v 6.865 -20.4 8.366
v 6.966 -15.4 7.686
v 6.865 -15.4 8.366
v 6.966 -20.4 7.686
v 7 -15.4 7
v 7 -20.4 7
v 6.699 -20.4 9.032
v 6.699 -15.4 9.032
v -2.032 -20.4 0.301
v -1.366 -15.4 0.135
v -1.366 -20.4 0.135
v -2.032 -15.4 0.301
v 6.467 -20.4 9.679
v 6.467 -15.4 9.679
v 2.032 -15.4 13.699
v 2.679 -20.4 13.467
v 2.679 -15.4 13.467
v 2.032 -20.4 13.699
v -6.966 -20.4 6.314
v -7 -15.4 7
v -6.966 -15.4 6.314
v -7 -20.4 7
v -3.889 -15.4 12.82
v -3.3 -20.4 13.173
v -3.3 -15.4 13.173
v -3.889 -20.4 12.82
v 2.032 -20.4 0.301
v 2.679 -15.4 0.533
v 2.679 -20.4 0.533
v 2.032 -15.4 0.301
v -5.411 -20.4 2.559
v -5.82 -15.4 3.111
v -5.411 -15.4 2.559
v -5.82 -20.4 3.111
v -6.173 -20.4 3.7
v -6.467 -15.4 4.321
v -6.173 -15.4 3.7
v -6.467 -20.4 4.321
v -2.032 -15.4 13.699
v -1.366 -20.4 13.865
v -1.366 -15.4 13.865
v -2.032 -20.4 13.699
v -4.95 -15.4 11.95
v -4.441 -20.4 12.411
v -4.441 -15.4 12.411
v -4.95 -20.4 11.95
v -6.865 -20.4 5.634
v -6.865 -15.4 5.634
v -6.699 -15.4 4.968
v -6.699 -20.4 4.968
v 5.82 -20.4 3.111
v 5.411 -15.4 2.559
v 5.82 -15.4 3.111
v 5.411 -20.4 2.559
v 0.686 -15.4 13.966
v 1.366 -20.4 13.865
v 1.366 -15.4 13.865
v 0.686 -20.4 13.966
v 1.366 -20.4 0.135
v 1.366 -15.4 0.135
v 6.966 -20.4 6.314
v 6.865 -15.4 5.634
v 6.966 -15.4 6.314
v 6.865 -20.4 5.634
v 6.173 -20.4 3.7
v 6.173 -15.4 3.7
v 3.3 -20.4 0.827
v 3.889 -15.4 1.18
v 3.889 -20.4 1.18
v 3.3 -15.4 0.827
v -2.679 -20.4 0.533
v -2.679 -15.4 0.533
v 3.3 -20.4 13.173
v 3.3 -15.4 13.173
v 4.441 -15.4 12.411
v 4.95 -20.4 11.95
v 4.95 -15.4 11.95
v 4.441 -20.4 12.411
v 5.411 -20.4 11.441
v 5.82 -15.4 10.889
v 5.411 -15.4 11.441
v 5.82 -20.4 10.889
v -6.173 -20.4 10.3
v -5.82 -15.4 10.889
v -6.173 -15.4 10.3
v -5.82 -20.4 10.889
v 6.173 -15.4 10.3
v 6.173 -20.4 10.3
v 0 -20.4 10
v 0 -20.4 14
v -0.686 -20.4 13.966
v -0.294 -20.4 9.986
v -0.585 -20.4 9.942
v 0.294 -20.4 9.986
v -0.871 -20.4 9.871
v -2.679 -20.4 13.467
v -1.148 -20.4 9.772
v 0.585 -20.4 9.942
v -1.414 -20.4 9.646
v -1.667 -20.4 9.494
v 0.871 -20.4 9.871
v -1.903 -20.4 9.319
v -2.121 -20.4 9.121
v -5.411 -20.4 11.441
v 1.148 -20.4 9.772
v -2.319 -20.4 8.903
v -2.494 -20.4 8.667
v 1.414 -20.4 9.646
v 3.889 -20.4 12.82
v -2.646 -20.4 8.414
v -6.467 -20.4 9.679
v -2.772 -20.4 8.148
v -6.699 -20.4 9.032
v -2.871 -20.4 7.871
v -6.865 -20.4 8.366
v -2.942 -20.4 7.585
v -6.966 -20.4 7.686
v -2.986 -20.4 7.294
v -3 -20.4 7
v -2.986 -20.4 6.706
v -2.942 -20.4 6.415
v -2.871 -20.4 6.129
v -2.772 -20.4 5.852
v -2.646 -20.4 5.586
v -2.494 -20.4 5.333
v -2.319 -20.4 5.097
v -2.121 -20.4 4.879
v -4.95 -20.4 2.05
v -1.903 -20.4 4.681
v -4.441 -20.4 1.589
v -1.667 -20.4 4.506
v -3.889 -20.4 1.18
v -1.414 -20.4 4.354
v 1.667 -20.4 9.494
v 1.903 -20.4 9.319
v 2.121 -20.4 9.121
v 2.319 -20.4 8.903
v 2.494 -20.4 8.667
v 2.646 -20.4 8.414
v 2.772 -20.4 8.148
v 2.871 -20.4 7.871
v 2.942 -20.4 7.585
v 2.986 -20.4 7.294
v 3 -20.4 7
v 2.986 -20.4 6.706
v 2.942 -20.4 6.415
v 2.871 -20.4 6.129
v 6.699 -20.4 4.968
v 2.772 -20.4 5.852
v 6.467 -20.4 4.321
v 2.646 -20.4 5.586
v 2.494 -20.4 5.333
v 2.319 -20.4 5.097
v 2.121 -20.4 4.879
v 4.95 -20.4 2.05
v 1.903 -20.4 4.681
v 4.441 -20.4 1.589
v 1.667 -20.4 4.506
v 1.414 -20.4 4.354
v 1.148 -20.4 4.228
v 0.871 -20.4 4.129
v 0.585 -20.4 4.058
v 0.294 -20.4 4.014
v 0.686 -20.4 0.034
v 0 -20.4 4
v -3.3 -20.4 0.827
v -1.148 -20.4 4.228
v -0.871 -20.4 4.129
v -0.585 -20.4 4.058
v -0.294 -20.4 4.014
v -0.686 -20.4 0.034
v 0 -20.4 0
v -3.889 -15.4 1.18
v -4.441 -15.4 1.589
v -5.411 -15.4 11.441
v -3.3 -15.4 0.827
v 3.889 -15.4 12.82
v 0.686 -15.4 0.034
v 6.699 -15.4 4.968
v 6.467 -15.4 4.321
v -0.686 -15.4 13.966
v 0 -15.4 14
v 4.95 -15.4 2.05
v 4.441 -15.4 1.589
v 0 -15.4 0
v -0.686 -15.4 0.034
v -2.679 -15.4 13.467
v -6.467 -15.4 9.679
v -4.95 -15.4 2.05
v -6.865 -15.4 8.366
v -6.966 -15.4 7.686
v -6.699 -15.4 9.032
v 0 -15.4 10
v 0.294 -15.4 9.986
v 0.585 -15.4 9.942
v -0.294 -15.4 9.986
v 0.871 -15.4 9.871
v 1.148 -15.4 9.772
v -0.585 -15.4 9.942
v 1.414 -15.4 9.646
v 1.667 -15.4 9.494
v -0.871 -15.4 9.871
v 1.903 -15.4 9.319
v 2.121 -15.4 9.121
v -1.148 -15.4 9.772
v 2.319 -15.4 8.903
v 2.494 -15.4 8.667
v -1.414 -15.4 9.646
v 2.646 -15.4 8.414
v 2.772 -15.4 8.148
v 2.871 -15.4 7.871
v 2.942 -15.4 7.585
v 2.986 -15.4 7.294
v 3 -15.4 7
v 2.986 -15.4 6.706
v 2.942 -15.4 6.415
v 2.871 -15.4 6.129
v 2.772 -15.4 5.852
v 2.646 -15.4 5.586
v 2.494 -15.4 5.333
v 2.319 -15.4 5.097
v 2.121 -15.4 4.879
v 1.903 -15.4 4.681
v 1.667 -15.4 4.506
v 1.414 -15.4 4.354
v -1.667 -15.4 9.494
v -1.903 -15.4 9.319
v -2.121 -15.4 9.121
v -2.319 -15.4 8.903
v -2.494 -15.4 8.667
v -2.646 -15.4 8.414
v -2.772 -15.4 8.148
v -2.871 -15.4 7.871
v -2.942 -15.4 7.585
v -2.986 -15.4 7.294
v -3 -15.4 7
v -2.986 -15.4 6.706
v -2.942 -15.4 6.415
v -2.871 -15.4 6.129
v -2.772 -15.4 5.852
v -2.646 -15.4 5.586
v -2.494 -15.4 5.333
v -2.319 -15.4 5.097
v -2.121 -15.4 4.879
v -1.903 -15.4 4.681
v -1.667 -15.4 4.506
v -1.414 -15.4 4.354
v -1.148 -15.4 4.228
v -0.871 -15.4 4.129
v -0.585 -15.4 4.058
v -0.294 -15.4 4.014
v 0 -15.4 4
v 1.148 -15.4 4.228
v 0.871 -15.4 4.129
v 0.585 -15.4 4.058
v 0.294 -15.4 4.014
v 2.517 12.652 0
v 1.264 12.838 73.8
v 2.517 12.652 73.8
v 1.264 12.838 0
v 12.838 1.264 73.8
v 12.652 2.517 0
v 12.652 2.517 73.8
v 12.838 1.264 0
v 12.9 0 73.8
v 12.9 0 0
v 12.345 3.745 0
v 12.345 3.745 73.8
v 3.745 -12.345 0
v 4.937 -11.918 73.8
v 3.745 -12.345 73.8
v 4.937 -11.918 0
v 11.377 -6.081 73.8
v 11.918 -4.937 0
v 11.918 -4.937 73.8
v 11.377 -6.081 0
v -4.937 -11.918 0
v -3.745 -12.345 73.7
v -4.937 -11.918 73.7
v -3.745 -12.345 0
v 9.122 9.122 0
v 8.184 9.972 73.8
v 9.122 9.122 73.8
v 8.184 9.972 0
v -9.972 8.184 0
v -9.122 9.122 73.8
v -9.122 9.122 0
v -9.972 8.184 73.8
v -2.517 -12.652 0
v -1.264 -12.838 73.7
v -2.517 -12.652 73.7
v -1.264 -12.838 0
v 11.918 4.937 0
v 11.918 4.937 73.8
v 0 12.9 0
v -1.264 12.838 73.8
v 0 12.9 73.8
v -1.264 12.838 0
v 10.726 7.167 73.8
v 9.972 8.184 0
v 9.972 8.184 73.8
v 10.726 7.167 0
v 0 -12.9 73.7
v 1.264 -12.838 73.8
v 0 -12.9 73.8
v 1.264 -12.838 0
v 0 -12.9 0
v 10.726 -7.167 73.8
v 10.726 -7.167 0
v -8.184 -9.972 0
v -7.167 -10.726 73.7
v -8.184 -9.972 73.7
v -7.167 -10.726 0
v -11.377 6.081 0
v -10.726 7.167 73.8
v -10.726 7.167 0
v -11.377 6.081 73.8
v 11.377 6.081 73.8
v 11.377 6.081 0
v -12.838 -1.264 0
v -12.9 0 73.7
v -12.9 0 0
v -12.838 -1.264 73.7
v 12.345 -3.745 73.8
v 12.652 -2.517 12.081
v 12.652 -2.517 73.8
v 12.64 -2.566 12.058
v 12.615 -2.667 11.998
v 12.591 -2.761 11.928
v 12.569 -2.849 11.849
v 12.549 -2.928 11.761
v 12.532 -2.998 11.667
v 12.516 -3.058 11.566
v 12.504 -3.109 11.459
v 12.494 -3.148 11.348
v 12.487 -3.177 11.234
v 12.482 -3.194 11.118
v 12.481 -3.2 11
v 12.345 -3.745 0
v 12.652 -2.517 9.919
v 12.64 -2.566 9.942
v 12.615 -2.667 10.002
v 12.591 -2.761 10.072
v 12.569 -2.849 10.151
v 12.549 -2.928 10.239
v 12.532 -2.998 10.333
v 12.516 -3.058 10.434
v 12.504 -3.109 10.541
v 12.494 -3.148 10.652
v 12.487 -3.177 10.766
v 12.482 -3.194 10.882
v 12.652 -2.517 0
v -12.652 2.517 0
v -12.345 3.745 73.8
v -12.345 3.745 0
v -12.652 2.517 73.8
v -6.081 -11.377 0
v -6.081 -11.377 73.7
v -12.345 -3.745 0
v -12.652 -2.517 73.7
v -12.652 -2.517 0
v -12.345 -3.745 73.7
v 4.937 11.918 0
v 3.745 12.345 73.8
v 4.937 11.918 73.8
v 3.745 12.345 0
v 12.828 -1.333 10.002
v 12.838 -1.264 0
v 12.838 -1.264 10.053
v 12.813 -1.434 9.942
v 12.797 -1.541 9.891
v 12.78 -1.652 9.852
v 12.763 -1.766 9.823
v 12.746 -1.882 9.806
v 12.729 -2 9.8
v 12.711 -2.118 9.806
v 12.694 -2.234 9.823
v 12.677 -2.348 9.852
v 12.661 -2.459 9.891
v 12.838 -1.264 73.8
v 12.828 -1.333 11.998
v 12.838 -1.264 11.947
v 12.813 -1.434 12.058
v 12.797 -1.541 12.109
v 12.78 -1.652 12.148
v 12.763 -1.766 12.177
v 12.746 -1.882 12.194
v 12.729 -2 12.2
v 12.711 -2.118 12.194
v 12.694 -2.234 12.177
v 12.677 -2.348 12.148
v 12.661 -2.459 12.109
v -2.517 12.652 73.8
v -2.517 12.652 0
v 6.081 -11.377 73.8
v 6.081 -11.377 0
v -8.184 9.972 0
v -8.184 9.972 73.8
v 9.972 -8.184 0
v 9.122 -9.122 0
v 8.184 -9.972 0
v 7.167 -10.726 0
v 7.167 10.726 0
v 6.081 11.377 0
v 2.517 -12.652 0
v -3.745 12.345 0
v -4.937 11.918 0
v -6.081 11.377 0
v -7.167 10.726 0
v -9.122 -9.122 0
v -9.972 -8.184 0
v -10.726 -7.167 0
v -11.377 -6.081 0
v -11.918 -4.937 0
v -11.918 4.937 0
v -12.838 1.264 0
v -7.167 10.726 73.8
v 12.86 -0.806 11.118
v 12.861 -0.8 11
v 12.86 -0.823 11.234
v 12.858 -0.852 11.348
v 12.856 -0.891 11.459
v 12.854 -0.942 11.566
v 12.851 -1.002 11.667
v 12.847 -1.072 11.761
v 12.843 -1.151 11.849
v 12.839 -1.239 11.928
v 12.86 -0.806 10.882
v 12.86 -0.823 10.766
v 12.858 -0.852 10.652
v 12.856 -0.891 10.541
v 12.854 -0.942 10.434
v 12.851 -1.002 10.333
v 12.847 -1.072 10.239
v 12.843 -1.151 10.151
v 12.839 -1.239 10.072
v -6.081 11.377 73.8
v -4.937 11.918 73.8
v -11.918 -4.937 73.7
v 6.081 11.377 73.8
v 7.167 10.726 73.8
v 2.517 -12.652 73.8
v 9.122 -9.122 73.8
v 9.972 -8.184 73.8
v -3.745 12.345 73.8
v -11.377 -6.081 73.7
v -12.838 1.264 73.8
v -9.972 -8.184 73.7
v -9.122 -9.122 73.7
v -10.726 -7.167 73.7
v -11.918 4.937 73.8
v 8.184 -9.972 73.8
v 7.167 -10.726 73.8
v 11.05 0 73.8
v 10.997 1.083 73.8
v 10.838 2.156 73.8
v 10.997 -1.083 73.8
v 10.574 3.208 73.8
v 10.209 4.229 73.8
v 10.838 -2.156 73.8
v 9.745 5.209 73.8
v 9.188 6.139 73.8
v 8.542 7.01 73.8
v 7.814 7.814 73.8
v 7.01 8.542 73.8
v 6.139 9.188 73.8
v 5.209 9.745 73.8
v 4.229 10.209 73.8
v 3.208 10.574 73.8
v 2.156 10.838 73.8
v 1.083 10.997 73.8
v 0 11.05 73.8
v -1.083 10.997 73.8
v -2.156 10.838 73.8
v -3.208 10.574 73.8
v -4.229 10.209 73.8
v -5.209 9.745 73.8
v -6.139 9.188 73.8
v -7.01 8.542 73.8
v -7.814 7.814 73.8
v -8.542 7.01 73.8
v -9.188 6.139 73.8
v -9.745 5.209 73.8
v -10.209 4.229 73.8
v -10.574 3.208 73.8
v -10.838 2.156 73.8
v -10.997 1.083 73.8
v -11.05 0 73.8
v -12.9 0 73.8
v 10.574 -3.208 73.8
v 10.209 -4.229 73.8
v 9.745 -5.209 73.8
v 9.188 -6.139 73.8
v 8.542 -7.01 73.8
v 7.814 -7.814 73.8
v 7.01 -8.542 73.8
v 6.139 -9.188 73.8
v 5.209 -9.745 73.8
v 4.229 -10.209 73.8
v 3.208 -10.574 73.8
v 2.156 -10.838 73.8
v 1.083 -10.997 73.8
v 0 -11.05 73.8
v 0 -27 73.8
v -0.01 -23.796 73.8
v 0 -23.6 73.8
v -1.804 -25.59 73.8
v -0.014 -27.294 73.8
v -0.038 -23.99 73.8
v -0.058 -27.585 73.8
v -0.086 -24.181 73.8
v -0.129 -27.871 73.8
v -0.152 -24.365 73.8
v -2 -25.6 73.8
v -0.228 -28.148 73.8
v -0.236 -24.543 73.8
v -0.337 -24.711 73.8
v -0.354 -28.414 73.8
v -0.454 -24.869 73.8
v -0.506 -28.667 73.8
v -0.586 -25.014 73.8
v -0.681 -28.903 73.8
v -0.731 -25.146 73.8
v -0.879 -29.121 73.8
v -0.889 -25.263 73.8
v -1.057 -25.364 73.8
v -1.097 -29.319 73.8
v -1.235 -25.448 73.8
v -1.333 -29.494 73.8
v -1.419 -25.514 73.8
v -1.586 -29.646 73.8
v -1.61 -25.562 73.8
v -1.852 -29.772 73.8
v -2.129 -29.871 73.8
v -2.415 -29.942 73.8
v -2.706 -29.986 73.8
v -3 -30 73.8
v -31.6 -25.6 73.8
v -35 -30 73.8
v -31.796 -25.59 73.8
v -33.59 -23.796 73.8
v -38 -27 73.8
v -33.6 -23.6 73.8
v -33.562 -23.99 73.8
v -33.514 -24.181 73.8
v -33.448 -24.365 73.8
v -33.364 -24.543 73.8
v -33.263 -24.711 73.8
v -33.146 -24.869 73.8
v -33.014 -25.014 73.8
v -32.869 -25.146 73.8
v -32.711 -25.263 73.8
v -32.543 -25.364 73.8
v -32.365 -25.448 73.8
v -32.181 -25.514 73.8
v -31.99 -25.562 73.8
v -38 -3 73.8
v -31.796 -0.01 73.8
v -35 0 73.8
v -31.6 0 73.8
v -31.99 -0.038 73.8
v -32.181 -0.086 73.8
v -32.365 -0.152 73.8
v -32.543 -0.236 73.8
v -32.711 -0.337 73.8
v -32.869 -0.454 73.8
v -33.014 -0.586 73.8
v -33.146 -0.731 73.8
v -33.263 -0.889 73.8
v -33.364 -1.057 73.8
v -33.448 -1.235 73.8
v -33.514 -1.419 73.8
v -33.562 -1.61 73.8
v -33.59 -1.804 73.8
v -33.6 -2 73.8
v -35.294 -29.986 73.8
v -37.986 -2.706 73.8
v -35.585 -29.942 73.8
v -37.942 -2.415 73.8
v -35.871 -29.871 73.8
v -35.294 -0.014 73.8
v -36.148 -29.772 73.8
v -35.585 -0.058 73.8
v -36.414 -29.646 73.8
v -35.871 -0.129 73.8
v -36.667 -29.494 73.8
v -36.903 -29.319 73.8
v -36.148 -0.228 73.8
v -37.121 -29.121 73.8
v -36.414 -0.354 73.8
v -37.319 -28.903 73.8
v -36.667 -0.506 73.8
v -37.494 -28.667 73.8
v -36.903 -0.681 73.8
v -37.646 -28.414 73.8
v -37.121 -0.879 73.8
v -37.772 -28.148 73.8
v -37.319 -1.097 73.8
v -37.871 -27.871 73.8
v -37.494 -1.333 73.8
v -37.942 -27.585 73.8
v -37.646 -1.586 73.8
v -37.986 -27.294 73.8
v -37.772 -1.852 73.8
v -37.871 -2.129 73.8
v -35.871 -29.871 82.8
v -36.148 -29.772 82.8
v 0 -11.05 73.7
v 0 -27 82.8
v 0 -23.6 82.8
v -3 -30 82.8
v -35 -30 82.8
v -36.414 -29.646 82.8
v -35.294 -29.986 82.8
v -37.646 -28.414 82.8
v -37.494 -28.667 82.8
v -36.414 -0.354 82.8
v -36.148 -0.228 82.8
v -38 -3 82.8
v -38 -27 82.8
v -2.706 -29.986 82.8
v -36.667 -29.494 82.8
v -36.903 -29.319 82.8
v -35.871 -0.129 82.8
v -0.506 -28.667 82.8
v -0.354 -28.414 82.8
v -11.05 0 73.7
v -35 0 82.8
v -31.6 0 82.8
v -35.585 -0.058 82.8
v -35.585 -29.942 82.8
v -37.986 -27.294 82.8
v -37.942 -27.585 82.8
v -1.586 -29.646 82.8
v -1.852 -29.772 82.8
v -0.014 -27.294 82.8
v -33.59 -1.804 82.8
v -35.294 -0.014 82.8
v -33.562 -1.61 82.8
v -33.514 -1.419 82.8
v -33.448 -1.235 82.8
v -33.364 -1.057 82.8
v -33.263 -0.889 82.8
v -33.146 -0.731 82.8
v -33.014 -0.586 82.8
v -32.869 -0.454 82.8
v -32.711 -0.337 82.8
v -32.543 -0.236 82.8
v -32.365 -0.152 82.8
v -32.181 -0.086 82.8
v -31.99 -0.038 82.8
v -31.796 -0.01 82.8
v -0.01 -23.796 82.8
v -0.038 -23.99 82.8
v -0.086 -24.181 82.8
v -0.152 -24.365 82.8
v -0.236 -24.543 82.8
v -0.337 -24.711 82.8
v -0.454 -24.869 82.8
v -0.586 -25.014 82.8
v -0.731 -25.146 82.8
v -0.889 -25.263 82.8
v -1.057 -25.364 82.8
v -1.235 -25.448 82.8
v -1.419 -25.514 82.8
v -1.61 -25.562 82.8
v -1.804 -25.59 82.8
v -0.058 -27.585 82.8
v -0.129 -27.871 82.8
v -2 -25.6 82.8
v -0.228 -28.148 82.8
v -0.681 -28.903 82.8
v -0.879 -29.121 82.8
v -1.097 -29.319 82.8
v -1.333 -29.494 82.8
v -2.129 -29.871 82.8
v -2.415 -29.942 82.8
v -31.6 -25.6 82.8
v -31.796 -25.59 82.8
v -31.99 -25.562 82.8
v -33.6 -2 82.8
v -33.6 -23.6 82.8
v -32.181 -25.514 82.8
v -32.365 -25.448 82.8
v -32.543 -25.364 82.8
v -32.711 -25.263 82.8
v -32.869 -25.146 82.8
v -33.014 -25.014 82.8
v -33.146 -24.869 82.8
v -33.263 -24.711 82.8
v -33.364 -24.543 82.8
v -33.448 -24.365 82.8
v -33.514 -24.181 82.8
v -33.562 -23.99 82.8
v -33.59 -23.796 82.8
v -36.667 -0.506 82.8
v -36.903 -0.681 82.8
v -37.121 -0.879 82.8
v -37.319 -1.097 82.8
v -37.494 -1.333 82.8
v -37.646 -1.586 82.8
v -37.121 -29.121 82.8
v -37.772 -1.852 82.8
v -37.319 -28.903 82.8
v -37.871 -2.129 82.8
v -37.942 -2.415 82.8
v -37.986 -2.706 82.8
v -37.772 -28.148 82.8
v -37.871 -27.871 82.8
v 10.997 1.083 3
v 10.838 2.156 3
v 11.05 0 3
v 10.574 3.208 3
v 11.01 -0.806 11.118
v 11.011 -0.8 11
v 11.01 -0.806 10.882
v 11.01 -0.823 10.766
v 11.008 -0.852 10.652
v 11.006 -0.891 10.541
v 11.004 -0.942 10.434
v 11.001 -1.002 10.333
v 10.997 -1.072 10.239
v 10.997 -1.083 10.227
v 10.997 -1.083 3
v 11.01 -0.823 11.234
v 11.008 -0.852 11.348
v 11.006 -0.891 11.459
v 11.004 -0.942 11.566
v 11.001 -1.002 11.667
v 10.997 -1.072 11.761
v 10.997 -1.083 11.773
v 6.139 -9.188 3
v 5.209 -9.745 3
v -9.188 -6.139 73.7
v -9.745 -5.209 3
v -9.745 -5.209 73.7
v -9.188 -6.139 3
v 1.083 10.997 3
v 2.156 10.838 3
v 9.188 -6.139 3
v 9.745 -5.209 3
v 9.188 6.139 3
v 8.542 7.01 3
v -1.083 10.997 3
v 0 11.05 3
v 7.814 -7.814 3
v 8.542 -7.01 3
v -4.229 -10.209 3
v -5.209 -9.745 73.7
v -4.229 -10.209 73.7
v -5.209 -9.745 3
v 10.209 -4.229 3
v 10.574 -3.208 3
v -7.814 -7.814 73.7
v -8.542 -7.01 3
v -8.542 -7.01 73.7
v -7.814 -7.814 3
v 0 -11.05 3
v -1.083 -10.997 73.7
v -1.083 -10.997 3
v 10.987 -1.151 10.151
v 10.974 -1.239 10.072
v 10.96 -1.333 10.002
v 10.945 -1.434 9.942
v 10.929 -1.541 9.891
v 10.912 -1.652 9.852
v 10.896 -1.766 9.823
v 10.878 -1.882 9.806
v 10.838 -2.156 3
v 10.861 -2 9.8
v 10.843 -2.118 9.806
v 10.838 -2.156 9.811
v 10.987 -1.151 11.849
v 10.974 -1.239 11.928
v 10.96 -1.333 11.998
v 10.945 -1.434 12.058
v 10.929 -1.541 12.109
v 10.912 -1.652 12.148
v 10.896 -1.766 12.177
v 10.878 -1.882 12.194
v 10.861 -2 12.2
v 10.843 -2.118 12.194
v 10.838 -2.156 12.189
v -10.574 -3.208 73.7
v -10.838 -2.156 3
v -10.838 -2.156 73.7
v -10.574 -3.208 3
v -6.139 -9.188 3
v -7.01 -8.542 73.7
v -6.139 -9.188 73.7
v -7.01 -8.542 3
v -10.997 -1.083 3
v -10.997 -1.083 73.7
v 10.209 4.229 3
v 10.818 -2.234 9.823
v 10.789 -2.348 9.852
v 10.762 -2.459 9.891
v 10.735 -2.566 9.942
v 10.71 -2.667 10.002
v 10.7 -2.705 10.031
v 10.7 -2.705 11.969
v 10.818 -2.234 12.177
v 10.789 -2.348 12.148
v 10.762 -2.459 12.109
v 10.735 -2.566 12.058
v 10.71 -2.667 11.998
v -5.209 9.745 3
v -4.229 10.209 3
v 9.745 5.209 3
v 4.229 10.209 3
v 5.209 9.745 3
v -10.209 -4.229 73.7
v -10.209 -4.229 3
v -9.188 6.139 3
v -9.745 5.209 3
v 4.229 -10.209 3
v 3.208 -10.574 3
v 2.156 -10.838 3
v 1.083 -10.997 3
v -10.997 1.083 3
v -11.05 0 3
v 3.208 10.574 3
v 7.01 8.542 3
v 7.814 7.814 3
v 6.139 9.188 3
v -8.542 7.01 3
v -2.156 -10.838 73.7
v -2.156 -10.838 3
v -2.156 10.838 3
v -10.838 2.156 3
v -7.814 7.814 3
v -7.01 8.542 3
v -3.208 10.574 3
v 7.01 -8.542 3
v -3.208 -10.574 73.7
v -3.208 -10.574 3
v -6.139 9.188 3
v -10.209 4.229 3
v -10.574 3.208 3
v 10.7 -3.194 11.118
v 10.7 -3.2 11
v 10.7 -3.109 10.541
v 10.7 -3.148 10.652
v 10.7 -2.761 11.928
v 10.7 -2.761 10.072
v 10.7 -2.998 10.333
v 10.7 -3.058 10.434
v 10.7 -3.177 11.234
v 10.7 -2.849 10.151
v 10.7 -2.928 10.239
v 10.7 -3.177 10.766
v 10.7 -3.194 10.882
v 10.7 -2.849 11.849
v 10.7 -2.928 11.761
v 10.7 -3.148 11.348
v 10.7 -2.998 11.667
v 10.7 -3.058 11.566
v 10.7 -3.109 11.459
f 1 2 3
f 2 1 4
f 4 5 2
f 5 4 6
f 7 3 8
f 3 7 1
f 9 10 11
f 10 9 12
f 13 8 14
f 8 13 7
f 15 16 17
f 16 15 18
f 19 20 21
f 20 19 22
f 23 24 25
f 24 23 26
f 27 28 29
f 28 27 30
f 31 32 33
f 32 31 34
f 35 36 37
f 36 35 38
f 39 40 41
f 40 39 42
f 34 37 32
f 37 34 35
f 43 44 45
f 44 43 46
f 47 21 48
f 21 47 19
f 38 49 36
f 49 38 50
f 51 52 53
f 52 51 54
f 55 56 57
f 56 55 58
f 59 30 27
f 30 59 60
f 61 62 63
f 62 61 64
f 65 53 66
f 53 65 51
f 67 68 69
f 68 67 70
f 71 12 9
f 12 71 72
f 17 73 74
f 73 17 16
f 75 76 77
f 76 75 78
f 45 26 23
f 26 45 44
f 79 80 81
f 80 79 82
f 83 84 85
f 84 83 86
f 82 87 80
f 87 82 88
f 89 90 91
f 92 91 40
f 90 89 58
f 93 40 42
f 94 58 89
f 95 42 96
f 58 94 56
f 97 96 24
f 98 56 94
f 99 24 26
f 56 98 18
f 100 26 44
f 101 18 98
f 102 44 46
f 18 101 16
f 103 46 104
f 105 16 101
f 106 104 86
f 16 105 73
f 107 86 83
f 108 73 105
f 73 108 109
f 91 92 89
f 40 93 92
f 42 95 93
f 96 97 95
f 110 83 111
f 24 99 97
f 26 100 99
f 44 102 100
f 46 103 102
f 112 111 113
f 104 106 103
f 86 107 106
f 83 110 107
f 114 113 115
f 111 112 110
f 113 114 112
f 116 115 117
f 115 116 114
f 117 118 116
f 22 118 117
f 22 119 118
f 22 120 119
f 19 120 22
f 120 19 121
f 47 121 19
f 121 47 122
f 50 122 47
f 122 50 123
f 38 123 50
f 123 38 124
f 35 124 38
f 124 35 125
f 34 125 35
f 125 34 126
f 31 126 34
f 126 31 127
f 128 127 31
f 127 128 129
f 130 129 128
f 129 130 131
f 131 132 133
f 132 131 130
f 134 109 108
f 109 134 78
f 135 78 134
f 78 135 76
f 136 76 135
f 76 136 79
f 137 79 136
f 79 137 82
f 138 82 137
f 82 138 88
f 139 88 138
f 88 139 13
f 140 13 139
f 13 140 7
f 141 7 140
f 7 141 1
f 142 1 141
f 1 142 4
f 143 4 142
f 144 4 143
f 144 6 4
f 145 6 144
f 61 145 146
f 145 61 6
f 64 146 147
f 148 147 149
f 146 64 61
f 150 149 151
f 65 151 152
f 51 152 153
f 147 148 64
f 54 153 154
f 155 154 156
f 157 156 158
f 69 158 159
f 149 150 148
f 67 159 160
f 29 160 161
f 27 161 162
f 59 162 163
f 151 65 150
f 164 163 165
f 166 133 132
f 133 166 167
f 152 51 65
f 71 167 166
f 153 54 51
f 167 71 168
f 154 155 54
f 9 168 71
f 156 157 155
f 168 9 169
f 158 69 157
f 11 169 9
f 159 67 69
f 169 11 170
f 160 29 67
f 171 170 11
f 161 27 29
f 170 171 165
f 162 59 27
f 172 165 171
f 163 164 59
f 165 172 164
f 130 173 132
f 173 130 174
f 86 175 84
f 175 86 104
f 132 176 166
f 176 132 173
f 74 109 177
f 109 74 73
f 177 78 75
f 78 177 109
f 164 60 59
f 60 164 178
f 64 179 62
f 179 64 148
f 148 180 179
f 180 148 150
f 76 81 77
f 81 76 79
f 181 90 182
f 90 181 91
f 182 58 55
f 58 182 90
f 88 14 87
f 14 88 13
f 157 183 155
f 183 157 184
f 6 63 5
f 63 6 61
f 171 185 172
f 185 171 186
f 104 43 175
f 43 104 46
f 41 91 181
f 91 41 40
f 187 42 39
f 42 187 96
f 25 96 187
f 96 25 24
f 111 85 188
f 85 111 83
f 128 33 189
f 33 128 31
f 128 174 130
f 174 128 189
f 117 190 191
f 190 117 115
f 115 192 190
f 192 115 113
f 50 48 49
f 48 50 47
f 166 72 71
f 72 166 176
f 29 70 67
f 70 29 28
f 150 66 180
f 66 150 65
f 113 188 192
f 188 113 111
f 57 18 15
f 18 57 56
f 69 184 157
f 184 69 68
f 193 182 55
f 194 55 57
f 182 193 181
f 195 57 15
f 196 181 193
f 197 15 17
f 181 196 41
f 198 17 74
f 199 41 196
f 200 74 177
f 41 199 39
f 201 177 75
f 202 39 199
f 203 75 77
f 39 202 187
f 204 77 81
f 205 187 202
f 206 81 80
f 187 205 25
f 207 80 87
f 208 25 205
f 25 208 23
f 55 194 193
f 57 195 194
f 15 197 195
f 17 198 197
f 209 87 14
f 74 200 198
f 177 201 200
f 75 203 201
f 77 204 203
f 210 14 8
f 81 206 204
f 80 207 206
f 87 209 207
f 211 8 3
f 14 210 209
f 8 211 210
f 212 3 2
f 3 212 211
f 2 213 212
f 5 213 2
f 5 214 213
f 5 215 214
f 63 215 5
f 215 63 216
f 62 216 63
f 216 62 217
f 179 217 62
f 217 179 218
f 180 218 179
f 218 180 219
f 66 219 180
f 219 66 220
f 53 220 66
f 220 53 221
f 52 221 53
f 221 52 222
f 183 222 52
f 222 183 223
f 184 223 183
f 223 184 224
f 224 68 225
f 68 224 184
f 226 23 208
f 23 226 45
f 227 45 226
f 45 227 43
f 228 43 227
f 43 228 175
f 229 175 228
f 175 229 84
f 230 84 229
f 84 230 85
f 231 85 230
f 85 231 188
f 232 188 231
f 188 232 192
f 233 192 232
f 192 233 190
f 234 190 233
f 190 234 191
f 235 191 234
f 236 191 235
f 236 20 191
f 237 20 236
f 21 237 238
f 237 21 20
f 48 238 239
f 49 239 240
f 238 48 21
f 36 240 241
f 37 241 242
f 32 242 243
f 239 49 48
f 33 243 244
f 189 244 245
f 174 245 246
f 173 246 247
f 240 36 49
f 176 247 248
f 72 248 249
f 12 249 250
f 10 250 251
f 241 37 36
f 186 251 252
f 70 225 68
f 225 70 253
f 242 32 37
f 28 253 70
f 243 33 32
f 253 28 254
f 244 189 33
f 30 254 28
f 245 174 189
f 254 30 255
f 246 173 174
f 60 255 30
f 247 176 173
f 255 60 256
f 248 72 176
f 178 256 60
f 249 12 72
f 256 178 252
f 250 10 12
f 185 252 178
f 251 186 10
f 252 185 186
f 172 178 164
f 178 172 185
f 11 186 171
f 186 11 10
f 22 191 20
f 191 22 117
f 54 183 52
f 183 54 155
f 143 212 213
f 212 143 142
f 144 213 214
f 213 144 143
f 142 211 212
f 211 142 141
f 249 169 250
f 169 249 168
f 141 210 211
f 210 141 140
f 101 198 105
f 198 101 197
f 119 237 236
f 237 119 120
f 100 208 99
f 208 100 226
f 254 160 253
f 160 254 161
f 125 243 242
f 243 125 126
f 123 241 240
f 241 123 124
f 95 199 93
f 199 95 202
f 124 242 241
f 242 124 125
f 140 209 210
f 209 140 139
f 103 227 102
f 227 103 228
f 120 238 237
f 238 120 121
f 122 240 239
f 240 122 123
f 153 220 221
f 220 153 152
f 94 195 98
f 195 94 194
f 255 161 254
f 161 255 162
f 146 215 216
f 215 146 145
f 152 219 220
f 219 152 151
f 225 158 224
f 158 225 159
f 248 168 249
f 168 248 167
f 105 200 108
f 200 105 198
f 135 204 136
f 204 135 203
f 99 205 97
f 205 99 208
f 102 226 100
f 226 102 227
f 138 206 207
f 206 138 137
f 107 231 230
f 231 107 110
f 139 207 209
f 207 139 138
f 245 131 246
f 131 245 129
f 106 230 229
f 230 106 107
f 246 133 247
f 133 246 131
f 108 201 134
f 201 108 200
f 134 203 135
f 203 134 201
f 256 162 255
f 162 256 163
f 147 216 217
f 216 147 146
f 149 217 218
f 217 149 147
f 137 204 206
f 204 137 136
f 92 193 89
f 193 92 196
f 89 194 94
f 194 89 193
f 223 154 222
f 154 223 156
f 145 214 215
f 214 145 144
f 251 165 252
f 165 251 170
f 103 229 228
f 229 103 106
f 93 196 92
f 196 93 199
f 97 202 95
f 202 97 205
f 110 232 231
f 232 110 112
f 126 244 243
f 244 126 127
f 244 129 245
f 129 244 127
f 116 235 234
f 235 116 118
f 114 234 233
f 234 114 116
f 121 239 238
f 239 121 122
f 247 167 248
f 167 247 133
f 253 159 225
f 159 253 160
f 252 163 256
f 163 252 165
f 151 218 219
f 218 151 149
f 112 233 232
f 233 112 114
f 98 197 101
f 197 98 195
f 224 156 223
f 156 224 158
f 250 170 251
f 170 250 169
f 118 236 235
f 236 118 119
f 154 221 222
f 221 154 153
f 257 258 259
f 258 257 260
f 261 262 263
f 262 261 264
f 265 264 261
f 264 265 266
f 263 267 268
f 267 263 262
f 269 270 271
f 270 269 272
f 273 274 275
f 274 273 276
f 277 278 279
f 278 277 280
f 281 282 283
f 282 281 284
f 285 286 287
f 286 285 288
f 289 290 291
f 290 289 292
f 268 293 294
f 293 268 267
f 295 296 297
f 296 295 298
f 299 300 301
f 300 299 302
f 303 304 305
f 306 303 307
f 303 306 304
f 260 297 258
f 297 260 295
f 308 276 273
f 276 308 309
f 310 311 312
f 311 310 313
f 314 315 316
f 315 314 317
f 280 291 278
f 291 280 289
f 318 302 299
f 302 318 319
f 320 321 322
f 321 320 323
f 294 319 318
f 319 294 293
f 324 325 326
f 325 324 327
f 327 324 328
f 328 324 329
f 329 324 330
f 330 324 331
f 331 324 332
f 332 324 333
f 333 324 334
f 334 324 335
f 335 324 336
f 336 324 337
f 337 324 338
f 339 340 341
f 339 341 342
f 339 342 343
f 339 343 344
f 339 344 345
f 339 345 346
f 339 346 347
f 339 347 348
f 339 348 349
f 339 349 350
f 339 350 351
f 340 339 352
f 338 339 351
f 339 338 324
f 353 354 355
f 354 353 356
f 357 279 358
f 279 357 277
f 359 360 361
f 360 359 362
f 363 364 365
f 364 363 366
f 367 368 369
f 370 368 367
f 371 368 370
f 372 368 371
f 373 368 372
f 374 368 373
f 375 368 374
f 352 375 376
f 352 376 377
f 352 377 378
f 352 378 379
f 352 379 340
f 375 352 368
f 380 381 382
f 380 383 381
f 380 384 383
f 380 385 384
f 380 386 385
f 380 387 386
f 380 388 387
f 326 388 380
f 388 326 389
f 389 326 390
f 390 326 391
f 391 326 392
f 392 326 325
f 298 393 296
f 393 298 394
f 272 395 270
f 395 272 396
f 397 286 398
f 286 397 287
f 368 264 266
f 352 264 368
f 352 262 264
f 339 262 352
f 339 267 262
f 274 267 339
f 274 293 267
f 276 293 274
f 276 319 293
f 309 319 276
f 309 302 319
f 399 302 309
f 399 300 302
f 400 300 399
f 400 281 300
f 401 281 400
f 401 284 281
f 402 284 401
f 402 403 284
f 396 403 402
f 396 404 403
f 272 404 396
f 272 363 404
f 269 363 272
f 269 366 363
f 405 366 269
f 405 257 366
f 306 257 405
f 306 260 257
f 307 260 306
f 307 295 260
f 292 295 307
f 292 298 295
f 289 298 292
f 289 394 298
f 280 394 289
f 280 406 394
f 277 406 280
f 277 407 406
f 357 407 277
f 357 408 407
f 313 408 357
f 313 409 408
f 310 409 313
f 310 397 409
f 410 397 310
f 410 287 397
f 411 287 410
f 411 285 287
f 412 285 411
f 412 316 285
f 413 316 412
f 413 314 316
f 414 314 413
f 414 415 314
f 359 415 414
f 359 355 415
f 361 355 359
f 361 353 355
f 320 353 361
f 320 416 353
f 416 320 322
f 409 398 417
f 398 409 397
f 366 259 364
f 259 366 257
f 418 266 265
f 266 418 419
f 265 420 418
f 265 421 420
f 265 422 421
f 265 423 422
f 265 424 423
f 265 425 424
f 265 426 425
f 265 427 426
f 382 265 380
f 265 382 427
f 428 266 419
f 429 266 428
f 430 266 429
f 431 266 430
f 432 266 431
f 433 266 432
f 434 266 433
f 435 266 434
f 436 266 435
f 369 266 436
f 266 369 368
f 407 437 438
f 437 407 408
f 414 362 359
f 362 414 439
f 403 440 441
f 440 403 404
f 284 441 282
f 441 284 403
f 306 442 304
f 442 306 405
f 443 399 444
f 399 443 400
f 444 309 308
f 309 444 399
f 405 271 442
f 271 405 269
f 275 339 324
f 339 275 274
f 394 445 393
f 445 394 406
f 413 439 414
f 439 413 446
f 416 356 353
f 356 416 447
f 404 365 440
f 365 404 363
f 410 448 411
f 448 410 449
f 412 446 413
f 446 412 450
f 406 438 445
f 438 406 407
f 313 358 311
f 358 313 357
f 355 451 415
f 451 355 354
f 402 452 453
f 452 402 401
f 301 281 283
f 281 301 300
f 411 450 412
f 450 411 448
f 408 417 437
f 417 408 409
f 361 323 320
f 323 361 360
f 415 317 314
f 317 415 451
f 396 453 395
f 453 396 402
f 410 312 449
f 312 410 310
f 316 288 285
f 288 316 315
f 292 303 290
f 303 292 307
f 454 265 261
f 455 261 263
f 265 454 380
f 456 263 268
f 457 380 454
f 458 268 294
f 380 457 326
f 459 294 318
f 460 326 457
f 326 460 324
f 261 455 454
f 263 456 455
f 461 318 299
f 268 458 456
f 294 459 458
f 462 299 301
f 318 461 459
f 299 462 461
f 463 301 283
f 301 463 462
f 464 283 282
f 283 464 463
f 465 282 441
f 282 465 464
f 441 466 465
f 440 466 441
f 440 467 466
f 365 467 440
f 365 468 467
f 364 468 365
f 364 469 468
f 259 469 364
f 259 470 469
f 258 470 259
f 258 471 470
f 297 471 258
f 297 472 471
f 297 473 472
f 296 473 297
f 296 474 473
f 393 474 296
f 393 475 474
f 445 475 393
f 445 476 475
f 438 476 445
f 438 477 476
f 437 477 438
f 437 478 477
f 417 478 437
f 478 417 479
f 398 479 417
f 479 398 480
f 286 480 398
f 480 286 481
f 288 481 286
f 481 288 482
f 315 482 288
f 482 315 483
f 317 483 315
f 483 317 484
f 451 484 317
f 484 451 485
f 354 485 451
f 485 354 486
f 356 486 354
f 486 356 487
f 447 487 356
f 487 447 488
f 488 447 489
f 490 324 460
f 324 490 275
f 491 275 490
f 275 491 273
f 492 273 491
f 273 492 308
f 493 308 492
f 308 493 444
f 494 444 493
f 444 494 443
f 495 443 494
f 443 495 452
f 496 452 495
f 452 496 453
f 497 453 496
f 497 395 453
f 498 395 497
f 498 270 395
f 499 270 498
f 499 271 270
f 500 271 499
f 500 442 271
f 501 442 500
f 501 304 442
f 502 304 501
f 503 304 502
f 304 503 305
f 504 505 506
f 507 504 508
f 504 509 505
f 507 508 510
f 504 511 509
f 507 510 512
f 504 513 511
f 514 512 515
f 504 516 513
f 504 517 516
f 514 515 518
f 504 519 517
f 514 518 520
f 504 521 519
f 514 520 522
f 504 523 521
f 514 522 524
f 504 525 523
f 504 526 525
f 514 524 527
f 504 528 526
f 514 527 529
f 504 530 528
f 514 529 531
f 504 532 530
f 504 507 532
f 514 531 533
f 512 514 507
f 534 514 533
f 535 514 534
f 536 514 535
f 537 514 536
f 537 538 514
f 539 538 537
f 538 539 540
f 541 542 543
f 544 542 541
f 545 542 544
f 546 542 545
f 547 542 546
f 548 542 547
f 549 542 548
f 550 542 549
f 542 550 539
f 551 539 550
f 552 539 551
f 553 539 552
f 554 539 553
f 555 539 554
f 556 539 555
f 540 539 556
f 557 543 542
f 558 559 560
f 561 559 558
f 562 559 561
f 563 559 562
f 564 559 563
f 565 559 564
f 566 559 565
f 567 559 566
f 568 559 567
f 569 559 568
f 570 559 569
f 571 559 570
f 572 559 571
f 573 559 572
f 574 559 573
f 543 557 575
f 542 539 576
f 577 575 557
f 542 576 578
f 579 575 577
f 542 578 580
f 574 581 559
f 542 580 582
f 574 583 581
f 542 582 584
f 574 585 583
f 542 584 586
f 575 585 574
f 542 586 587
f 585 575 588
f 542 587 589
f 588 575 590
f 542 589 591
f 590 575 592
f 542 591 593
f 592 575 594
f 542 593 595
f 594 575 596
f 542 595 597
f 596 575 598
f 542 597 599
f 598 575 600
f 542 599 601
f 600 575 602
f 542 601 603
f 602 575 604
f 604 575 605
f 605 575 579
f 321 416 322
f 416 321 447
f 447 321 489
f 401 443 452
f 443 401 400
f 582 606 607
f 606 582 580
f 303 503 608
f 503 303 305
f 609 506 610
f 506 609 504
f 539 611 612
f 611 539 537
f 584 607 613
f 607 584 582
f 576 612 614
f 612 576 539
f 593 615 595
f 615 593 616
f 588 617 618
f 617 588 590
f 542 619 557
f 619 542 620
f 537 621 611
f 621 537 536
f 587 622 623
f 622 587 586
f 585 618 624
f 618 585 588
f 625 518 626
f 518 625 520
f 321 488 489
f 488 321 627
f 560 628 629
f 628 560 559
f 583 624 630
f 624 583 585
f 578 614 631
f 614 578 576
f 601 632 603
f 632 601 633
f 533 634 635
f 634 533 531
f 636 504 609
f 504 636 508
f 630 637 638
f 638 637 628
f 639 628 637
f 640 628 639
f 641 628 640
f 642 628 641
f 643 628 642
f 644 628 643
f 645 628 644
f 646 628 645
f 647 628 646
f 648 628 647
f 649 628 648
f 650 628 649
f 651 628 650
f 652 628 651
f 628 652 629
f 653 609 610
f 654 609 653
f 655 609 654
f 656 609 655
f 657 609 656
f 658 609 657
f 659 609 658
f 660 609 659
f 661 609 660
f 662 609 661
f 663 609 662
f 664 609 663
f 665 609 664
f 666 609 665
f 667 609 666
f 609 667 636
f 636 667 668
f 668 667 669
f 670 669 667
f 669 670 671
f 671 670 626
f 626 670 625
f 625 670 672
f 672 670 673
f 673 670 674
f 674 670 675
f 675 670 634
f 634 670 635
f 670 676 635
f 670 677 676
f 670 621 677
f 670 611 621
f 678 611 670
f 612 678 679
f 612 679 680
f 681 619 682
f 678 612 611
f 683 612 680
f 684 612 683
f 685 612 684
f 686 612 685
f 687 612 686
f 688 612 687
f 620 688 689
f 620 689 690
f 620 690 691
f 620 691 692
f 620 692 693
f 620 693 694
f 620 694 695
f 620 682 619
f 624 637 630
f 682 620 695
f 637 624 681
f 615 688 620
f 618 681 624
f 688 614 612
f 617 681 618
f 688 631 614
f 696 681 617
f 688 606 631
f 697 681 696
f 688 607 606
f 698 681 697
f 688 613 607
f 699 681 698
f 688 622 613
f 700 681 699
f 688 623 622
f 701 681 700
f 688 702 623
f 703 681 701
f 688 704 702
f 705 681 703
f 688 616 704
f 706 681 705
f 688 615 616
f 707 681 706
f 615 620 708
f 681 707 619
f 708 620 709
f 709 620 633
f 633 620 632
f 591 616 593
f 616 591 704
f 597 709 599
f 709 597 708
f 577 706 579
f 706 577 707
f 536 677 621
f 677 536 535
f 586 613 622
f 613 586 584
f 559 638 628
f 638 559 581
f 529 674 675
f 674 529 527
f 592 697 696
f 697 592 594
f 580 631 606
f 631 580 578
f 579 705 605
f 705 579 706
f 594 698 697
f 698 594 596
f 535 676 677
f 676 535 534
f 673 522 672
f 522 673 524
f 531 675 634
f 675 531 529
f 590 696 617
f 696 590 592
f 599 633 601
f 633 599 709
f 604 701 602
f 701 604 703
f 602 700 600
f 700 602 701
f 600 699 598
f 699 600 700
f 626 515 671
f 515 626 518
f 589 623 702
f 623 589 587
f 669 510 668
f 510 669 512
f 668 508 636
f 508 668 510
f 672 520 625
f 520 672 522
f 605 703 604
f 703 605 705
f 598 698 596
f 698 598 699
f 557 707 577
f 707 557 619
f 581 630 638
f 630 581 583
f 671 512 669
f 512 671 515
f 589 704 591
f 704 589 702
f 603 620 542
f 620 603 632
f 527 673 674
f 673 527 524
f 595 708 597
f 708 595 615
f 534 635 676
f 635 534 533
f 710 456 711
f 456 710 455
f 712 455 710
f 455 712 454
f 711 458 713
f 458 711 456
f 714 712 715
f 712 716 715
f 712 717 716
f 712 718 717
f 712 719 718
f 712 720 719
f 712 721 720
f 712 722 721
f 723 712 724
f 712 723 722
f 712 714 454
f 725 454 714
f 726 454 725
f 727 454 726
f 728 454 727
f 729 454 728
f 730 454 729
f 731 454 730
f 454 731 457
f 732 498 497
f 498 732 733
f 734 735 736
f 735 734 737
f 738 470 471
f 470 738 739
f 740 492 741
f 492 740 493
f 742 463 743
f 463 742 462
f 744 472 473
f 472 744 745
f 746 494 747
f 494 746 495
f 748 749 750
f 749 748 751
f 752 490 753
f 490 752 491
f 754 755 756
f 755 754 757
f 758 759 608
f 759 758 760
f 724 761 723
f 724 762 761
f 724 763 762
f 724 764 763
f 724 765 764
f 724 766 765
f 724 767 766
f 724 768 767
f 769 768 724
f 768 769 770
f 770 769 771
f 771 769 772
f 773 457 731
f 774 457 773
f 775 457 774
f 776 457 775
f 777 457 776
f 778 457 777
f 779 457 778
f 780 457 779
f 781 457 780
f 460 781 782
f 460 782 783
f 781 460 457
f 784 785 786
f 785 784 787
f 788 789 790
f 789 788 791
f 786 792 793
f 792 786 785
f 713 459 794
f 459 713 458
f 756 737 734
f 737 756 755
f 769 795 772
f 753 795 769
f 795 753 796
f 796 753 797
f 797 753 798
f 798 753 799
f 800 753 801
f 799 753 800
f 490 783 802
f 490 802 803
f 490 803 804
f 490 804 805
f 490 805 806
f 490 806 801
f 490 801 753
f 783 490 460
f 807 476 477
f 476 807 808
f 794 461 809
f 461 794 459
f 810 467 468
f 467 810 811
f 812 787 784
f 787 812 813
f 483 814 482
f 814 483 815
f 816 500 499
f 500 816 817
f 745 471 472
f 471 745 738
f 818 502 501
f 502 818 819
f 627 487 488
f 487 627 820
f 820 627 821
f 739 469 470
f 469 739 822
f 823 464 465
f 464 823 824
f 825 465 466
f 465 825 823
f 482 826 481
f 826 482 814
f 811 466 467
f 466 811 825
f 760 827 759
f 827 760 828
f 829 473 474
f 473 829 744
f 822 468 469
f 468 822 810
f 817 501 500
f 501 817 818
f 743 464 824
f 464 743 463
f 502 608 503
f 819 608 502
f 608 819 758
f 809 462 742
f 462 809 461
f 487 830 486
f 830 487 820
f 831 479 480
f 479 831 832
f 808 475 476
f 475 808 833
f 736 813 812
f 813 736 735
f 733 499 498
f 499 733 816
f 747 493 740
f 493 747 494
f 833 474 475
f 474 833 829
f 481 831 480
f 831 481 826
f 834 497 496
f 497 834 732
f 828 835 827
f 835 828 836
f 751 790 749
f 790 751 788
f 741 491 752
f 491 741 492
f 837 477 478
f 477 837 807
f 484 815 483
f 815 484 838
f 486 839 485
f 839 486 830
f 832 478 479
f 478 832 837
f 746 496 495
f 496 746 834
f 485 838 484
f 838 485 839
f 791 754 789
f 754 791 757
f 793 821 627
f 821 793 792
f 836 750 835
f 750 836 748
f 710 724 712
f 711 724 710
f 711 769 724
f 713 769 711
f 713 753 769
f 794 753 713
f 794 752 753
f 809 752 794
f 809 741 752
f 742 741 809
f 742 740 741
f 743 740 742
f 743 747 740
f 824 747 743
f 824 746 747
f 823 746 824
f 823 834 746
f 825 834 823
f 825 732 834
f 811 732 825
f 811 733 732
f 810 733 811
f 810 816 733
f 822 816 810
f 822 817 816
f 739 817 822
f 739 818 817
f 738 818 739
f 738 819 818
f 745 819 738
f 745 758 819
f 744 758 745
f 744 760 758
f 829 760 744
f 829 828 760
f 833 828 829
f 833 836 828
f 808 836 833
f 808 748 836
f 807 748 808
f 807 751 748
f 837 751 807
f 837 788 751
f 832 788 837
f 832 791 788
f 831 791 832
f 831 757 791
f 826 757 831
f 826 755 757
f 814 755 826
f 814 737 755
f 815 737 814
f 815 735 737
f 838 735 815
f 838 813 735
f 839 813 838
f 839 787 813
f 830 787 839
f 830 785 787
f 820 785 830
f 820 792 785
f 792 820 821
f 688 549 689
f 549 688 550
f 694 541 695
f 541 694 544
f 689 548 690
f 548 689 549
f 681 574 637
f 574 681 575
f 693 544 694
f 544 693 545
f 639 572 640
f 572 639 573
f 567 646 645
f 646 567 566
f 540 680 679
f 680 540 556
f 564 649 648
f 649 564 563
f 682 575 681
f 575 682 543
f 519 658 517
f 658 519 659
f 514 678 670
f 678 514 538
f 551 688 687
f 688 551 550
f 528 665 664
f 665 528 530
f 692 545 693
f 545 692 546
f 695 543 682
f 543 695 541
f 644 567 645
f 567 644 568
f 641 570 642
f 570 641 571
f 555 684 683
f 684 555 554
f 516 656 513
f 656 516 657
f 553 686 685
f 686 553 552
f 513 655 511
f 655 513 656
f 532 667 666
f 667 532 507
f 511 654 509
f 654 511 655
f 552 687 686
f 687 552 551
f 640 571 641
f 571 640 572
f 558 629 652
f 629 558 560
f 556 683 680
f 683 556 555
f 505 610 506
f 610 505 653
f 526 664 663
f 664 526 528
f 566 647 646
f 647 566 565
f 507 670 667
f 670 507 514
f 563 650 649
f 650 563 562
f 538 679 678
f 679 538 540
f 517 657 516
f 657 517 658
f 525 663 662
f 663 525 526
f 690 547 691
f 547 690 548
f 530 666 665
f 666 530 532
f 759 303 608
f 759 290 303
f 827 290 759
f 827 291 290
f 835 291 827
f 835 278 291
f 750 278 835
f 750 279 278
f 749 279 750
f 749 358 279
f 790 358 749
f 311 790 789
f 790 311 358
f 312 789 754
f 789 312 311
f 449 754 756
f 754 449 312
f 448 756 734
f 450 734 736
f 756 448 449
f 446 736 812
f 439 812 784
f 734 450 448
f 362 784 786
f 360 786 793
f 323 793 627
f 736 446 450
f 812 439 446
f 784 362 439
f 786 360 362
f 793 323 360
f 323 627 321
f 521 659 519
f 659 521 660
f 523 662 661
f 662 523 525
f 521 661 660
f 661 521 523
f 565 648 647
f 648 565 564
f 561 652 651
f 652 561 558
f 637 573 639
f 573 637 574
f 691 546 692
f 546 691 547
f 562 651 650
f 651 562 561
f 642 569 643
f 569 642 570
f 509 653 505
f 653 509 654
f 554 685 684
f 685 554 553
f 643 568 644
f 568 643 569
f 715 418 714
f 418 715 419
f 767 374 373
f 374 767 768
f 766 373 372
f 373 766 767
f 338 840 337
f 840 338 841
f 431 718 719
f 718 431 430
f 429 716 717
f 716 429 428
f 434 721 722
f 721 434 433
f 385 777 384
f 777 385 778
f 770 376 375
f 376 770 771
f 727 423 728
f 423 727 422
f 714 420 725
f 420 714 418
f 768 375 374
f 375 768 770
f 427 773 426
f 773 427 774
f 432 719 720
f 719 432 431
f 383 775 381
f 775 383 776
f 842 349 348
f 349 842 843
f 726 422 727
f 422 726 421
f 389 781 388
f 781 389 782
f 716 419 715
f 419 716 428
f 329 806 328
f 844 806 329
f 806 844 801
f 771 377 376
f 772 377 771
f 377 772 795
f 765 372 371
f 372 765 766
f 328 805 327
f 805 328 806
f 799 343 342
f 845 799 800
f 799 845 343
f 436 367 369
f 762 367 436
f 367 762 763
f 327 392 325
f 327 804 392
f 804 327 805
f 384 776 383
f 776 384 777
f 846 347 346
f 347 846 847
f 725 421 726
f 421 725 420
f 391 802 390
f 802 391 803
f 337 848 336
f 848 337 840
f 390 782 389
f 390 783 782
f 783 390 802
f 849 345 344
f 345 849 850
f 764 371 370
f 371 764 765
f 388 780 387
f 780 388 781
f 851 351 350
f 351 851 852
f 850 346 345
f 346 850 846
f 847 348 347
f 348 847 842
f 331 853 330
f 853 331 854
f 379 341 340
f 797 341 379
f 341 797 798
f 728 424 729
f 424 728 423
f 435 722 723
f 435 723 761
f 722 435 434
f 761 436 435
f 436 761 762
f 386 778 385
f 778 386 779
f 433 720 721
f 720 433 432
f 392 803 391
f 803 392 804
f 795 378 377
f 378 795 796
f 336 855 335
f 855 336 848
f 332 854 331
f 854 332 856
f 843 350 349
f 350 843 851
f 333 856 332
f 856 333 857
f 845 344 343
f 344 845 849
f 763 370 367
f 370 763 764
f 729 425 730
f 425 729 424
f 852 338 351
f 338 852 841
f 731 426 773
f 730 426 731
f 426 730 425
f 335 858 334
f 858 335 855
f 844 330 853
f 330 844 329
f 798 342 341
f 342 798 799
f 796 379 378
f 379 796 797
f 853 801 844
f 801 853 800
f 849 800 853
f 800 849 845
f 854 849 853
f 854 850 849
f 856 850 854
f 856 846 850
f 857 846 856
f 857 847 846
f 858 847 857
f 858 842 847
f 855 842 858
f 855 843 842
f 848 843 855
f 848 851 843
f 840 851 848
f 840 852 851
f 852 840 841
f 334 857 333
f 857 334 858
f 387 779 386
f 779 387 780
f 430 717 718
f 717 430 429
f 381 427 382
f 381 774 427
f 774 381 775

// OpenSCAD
/*
 * WAYPOINT cartridge concept — CC-BY-SA-4.0
 *
 * Select one profile, render, then export an STL. This is a mechanical
 * concept drawing, not a validated safety enclosure. Verify the actual
 * cell, contact carrier, core STEP model, print process, and ventilation
 * before fabrication or inserting a cell.
 */

profile = "21700";  // "18650", "21700", or "4680"
wall = 2.2;
floor = 3.0;
core_x = 38;
core_y = 30;
core_z = 9;
clearance = 0.7;
$fn = 64;

function cell_diameter(p) = p == "18650" ? 18.6 : p == "21700" ? 21.4 : 46.8;
function cell_length(p) = p == "18650" ? 65.4 : p == "21700" ? 70.8 : 80.6;

cell_d = cell_diameter(profile);
cell_l = cell_length(profile);
outer_d = cell_d + 2 * wall;
body_h = cell_l + floor + core_z;

module rounded_block(x, y, z, r) {
  hull() {
    for (ix = [-1, 1]) for (iy = [-1, 1])
      translate([ix * (x / 2 - r), iy * (y / 2 - r), 0]) cylinder(r = r, h = z);
  }
}

module lanyard_loop() {
  difference() {
    translate([0, -(outer_d / 2 + 5), 7]) rotate([90, 0, 0]) cylinder(r = 7, h = 5, center = true);
    translate([0, -(outer_d / 2 + 5), 7]) rotate([90, 0, 0]) cylinder(r = 3, h = 8, center = true);
  }
}

module cartridge_shell() {
  difference() {
    union() {
      cylinder(d = outer_d, h = body_h - core_z);
      translate([-core_x / 2, -core_y / 2, body_h - core_z])
        rounded_block(core_x, core_y, core_z, 3);
      lanyard_loop();
    }
    /* Cell cavity is intentionally open at the core end for a removable carrier. */
    translate([0, 0, floor]) cylinder(d = cell_d + clearance, h = cell_l + core_z + 1);
    /* Core docking keep-out: refine from the actual exported PCB STEP model. */
    translate([-(core_x - 2 * wall) / 2, -(core_y - 2 * wall) / 2, body_h - core_z - 0.1])
      rounded_block(core_x - 2 * wall, core_y - 2 * wall, core_z + 1, 2);
    /* NTC wire/channel relief; locate after contact-carrier detail exists. */
    translate([cell_d / 2, -2, floor + 8]) rotate([0, 90, 0]) cylinder(d = 2.4, h = wall + 1);
  }
}

cartridge_shell();
